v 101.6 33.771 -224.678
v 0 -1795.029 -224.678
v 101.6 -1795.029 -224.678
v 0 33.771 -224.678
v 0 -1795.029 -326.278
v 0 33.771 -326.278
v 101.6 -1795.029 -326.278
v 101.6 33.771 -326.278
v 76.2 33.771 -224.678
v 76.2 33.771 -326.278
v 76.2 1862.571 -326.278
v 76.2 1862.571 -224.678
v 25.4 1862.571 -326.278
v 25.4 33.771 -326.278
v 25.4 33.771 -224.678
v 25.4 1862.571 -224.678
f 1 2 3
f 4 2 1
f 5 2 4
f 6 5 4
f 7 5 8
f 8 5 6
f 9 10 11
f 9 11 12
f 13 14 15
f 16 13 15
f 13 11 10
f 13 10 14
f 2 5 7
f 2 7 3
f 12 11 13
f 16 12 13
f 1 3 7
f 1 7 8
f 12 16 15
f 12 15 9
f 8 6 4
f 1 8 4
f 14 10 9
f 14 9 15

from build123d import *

# Parameters (mm, degrees)
F0_W     = 1828.8
F0_H     = 101.6
F1_DEPTH = 101.6
F2_W     = 25.4
F2_H     = 101.6
F3_DEPTH = 1828.8


with BuildPart() as f1:
    # F0 (on Right) → F1 (new body)
    with BuildSketch(Plane.YZ):
        with Locations((-880.628759, -275.477676)):
            Rectangle(F0_W, F0_H)
    extrude(amount=F1_DEPTH)


with BuildPart() as f3:
    # F2 (on face) → F3 (new body)
    with BuildSketch(Plane(origin=(0, 33.771241, 0), x_dir=(-1, 0, 0), z_dir=(0, 1, 0))):
        with Locations((-63.5, -275.477676)):
            Rectangle(F2_W, F2_H)
        with Locations((-38.1, -275.477676)):
            Rectangle(F2_W, F2_H)
    extrude(amount=F3_DEPTH)


solid = Compound([f1.part, f3.part])
